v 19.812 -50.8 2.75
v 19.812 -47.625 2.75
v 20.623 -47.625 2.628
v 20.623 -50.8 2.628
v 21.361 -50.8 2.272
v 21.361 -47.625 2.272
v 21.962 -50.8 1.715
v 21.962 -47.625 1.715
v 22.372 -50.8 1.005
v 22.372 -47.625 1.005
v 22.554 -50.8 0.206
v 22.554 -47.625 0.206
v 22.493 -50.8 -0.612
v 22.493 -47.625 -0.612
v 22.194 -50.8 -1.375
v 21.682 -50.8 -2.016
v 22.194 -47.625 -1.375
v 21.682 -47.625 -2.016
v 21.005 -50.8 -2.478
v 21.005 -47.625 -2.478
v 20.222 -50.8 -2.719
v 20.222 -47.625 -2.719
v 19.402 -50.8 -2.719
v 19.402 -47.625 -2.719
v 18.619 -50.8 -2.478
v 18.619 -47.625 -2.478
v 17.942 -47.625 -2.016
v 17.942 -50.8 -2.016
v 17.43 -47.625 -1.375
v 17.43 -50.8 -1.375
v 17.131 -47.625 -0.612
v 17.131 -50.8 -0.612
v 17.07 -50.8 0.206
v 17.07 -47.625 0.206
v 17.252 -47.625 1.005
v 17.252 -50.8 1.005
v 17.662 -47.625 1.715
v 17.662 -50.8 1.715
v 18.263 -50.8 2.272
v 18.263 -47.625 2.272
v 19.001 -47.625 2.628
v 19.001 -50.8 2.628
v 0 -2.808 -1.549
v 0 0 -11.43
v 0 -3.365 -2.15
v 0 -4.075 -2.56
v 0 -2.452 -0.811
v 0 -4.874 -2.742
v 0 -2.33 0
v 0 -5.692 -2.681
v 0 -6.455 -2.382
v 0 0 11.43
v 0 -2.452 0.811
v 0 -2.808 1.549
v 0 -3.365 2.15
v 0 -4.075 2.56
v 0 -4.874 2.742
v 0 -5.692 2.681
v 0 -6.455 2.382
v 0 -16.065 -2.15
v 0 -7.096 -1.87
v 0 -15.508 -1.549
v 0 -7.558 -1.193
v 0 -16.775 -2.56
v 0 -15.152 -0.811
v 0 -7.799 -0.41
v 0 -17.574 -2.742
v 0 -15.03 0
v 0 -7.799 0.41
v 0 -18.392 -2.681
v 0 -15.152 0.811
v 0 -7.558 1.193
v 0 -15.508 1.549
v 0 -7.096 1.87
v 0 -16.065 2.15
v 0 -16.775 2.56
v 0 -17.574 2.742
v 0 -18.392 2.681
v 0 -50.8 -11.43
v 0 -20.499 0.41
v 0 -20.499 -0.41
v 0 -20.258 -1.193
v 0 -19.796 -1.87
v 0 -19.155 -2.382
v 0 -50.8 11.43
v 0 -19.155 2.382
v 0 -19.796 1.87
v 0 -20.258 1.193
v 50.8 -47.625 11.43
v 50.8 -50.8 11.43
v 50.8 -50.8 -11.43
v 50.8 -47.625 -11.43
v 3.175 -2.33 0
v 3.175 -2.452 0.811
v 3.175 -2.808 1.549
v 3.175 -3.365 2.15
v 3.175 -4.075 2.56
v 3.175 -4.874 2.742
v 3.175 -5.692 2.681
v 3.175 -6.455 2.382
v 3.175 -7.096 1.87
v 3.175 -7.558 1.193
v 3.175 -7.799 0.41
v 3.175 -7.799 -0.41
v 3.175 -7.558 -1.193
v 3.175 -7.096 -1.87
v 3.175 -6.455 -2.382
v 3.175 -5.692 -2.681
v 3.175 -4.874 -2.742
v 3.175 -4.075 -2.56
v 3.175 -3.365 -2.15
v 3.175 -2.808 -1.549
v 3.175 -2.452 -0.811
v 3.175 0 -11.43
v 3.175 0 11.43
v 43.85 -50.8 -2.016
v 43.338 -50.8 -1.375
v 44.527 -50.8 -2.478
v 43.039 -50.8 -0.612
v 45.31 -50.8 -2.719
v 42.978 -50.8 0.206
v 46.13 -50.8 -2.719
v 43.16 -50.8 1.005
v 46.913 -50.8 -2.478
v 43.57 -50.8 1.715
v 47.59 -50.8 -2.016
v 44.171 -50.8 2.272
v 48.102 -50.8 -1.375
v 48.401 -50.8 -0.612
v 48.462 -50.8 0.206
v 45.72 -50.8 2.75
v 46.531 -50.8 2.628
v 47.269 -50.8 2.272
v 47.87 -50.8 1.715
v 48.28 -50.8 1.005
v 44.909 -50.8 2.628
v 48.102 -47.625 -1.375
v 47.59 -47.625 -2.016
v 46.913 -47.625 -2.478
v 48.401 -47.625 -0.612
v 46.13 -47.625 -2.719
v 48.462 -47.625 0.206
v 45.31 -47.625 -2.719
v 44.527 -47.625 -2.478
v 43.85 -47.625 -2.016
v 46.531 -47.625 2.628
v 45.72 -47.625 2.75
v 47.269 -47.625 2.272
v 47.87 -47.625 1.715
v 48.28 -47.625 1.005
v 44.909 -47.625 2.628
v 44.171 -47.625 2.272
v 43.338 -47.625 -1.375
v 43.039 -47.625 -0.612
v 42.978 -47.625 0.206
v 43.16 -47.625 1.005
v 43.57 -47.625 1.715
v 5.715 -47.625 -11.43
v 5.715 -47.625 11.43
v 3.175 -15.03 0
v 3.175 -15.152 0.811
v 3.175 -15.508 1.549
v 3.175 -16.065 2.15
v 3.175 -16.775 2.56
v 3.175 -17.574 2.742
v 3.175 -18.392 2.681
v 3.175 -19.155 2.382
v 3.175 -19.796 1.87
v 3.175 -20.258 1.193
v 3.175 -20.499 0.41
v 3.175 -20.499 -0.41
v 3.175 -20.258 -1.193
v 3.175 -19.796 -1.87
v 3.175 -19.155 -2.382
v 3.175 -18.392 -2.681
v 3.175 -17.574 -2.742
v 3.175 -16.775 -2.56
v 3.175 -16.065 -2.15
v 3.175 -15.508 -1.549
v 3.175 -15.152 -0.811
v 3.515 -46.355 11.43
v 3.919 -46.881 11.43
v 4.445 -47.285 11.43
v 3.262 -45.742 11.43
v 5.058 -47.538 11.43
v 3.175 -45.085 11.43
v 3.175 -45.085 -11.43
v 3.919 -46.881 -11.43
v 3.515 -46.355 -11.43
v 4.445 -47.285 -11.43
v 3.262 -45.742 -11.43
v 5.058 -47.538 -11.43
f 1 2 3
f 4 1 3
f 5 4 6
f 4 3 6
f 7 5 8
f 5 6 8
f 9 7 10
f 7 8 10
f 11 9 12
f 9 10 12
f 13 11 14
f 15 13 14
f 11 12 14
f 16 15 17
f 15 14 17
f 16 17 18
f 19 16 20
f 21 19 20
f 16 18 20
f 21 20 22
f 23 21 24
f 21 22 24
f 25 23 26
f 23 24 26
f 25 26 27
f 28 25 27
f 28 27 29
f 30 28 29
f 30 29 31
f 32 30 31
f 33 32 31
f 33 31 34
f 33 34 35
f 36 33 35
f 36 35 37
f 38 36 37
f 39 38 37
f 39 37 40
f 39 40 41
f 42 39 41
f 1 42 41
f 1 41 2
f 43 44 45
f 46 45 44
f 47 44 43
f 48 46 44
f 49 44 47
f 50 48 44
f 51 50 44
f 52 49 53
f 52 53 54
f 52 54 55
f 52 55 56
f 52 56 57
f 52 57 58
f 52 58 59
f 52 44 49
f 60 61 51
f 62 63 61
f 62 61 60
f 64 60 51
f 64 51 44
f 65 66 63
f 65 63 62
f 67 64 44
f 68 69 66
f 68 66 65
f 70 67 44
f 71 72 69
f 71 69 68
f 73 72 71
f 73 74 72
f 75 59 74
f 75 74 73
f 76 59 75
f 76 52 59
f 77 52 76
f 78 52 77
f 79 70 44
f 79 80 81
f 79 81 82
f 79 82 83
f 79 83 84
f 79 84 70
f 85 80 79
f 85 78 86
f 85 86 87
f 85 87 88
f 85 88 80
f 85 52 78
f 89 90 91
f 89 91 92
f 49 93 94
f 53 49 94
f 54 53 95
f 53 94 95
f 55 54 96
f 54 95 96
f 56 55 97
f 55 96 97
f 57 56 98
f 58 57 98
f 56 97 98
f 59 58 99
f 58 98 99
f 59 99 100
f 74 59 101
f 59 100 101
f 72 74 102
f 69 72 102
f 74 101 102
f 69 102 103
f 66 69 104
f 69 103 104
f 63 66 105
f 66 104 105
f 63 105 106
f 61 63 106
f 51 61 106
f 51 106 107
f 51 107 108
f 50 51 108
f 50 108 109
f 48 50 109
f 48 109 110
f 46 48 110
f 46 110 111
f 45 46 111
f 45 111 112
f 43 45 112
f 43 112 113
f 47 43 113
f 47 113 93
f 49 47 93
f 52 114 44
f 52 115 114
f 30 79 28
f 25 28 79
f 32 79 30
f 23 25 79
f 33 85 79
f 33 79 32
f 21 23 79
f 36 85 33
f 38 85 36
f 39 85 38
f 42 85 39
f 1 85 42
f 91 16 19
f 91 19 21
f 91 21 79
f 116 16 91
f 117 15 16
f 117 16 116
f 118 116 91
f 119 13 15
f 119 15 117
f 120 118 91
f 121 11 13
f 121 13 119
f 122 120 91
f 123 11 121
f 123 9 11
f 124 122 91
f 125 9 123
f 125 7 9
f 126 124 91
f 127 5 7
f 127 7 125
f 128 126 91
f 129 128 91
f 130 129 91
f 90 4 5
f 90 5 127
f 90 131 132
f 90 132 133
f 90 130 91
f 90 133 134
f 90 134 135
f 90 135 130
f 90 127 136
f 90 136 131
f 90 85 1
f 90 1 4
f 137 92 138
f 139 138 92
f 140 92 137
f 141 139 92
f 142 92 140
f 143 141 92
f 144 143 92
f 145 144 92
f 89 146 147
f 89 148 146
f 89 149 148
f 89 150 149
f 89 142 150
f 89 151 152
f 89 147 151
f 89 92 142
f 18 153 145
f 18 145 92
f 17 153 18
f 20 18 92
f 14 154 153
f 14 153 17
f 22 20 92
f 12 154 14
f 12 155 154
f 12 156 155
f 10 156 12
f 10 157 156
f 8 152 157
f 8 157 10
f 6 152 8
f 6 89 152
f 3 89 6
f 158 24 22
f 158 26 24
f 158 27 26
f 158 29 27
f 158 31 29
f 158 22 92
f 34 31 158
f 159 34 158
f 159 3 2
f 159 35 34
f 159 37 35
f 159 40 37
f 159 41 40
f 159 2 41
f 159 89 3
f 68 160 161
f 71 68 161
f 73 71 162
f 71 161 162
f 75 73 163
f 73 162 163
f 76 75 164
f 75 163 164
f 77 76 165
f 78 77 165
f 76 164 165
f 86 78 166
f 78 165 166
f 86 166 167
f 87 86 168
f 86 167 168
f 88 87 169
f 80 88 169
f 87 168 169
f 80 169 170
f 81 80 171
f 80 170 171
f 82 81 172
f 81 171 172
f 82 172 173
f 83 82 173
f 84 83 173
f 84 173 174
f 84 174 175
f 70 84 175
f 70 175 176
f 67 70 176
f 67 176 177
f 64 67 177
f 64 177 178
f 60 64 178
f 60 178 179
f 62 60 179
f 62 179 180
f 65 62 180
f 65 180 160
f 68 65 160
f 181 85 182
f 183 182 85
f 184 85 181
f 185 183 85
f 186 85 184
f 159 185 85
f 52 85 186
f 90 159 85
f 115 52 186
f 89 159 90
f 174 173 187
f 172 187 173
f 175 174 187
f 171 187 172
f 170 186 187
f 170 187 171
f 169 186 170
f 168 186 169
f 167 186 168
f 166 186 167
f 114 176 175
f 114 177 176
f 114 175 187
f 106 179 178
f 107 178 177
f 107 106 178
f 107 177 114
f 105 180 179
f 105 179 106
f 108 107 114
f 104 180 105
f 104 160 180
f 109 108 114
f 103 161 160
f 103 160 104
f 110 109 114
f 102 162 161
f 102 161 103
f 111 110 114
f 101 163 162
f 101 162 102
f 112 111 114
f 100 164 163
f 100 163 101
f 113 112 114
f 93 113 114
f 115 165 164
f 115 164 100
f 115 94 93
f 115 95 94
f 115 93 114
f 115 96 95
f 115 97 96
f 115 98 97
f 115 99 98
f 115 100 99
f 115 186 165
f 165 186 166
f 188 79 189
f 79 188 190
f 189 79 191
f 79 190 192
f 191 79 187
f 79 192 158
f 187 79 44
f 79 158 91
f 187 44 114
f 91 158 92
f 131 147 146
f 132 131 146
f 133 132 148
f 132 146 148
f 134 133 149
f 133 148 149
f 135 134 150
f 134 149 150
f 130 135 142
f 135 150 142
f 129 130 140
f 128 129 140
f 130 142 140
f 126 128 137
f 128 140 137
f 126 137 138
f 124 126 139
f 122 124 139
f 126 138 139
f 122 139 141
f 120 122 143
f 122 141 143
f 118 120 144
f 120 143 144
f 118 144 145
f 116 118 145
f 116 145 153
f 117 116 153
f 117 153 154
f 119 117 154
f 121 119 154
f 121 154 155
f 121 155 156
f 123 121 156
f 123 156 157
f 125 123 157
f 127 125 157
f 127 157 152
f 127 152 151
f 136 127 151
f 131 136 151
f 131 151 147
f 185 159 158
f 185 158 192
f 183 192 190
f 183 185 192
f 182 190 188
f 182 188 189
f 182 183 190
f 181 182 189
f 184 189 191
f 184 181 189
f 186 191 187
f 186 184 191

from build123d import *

# Parameters (mm, degrees)
BOSS_EXTRUDE1_DEPTH = 11.43
SKETCH3_R           = 2.75
CUT_EXTRUDE1_DEPTH  = 71.56504464
SKETCH4_R           = 2.75
CUT_EXTRUDE2_DEPTH  = 71.56504464


with BuildPart() as part:
    # Sketch2 → Boss-Extrude1 (new, symmetric)
    with BuildSketch(Plane.XY):
        with BuildLine():
            Line((0, 0), (0, -50.8))
            Line((0, -50.8), (50.8, -50.8))
            Line((50.8, -50.8), (50.8, -47.625))
            Line((50.8, -47.625), (5.715, -47.625))
            ThreePointArc((5.715, -47.625), (3.918948776, -46.881051224), (3.175, -45.085))
            Line((3.175, -45.085), (3.175, 0))
            Line((3.175, 0), (0, 0))
        make_face()
    extrude(amount=BOSS_EXTRUDE1_DEPTH, both=True)

    # Sketch3 → Cut-Extrude1 (cut, through all)
    with BuildSketch(Plane(origin=(3.175, 0, 0), x_dir=(0, 0, -1), z_dir=(1, 0, 0))):
        with Locations(Location((0, -5.08, 0), (0, 0, 90))):
            Circle(SKETCH3_R)
        with Locations(Location((0, -17.78, 0), (0, 0, 90))):
            Circle(SKETCH3_R)
    extrude(amount=-CUT_EXTRUDE1_DEPTH, mode=Mode.SUBTRACT)

    # Sketch4 → Cut-Extrude2 (cut, through all)
    with BuildSketch(Plane(origin=(0, -47.625, 0), x_dir=(1, 0, 0), z_dir=(0, 1, 0))):
        with Locations(Location((19.812, 0, 0), (0, 0, 270))):
            Circle(SKETCH4_R)
        with Locations(Location((45.72, 0, 0), (0, 0, 270))):
            Circle(SKETCH4_R)
    extrude(amount=-CUT_EXTRUDE2_DEPTH, mode=Mode.SUBTRACT)


solid = part.part
